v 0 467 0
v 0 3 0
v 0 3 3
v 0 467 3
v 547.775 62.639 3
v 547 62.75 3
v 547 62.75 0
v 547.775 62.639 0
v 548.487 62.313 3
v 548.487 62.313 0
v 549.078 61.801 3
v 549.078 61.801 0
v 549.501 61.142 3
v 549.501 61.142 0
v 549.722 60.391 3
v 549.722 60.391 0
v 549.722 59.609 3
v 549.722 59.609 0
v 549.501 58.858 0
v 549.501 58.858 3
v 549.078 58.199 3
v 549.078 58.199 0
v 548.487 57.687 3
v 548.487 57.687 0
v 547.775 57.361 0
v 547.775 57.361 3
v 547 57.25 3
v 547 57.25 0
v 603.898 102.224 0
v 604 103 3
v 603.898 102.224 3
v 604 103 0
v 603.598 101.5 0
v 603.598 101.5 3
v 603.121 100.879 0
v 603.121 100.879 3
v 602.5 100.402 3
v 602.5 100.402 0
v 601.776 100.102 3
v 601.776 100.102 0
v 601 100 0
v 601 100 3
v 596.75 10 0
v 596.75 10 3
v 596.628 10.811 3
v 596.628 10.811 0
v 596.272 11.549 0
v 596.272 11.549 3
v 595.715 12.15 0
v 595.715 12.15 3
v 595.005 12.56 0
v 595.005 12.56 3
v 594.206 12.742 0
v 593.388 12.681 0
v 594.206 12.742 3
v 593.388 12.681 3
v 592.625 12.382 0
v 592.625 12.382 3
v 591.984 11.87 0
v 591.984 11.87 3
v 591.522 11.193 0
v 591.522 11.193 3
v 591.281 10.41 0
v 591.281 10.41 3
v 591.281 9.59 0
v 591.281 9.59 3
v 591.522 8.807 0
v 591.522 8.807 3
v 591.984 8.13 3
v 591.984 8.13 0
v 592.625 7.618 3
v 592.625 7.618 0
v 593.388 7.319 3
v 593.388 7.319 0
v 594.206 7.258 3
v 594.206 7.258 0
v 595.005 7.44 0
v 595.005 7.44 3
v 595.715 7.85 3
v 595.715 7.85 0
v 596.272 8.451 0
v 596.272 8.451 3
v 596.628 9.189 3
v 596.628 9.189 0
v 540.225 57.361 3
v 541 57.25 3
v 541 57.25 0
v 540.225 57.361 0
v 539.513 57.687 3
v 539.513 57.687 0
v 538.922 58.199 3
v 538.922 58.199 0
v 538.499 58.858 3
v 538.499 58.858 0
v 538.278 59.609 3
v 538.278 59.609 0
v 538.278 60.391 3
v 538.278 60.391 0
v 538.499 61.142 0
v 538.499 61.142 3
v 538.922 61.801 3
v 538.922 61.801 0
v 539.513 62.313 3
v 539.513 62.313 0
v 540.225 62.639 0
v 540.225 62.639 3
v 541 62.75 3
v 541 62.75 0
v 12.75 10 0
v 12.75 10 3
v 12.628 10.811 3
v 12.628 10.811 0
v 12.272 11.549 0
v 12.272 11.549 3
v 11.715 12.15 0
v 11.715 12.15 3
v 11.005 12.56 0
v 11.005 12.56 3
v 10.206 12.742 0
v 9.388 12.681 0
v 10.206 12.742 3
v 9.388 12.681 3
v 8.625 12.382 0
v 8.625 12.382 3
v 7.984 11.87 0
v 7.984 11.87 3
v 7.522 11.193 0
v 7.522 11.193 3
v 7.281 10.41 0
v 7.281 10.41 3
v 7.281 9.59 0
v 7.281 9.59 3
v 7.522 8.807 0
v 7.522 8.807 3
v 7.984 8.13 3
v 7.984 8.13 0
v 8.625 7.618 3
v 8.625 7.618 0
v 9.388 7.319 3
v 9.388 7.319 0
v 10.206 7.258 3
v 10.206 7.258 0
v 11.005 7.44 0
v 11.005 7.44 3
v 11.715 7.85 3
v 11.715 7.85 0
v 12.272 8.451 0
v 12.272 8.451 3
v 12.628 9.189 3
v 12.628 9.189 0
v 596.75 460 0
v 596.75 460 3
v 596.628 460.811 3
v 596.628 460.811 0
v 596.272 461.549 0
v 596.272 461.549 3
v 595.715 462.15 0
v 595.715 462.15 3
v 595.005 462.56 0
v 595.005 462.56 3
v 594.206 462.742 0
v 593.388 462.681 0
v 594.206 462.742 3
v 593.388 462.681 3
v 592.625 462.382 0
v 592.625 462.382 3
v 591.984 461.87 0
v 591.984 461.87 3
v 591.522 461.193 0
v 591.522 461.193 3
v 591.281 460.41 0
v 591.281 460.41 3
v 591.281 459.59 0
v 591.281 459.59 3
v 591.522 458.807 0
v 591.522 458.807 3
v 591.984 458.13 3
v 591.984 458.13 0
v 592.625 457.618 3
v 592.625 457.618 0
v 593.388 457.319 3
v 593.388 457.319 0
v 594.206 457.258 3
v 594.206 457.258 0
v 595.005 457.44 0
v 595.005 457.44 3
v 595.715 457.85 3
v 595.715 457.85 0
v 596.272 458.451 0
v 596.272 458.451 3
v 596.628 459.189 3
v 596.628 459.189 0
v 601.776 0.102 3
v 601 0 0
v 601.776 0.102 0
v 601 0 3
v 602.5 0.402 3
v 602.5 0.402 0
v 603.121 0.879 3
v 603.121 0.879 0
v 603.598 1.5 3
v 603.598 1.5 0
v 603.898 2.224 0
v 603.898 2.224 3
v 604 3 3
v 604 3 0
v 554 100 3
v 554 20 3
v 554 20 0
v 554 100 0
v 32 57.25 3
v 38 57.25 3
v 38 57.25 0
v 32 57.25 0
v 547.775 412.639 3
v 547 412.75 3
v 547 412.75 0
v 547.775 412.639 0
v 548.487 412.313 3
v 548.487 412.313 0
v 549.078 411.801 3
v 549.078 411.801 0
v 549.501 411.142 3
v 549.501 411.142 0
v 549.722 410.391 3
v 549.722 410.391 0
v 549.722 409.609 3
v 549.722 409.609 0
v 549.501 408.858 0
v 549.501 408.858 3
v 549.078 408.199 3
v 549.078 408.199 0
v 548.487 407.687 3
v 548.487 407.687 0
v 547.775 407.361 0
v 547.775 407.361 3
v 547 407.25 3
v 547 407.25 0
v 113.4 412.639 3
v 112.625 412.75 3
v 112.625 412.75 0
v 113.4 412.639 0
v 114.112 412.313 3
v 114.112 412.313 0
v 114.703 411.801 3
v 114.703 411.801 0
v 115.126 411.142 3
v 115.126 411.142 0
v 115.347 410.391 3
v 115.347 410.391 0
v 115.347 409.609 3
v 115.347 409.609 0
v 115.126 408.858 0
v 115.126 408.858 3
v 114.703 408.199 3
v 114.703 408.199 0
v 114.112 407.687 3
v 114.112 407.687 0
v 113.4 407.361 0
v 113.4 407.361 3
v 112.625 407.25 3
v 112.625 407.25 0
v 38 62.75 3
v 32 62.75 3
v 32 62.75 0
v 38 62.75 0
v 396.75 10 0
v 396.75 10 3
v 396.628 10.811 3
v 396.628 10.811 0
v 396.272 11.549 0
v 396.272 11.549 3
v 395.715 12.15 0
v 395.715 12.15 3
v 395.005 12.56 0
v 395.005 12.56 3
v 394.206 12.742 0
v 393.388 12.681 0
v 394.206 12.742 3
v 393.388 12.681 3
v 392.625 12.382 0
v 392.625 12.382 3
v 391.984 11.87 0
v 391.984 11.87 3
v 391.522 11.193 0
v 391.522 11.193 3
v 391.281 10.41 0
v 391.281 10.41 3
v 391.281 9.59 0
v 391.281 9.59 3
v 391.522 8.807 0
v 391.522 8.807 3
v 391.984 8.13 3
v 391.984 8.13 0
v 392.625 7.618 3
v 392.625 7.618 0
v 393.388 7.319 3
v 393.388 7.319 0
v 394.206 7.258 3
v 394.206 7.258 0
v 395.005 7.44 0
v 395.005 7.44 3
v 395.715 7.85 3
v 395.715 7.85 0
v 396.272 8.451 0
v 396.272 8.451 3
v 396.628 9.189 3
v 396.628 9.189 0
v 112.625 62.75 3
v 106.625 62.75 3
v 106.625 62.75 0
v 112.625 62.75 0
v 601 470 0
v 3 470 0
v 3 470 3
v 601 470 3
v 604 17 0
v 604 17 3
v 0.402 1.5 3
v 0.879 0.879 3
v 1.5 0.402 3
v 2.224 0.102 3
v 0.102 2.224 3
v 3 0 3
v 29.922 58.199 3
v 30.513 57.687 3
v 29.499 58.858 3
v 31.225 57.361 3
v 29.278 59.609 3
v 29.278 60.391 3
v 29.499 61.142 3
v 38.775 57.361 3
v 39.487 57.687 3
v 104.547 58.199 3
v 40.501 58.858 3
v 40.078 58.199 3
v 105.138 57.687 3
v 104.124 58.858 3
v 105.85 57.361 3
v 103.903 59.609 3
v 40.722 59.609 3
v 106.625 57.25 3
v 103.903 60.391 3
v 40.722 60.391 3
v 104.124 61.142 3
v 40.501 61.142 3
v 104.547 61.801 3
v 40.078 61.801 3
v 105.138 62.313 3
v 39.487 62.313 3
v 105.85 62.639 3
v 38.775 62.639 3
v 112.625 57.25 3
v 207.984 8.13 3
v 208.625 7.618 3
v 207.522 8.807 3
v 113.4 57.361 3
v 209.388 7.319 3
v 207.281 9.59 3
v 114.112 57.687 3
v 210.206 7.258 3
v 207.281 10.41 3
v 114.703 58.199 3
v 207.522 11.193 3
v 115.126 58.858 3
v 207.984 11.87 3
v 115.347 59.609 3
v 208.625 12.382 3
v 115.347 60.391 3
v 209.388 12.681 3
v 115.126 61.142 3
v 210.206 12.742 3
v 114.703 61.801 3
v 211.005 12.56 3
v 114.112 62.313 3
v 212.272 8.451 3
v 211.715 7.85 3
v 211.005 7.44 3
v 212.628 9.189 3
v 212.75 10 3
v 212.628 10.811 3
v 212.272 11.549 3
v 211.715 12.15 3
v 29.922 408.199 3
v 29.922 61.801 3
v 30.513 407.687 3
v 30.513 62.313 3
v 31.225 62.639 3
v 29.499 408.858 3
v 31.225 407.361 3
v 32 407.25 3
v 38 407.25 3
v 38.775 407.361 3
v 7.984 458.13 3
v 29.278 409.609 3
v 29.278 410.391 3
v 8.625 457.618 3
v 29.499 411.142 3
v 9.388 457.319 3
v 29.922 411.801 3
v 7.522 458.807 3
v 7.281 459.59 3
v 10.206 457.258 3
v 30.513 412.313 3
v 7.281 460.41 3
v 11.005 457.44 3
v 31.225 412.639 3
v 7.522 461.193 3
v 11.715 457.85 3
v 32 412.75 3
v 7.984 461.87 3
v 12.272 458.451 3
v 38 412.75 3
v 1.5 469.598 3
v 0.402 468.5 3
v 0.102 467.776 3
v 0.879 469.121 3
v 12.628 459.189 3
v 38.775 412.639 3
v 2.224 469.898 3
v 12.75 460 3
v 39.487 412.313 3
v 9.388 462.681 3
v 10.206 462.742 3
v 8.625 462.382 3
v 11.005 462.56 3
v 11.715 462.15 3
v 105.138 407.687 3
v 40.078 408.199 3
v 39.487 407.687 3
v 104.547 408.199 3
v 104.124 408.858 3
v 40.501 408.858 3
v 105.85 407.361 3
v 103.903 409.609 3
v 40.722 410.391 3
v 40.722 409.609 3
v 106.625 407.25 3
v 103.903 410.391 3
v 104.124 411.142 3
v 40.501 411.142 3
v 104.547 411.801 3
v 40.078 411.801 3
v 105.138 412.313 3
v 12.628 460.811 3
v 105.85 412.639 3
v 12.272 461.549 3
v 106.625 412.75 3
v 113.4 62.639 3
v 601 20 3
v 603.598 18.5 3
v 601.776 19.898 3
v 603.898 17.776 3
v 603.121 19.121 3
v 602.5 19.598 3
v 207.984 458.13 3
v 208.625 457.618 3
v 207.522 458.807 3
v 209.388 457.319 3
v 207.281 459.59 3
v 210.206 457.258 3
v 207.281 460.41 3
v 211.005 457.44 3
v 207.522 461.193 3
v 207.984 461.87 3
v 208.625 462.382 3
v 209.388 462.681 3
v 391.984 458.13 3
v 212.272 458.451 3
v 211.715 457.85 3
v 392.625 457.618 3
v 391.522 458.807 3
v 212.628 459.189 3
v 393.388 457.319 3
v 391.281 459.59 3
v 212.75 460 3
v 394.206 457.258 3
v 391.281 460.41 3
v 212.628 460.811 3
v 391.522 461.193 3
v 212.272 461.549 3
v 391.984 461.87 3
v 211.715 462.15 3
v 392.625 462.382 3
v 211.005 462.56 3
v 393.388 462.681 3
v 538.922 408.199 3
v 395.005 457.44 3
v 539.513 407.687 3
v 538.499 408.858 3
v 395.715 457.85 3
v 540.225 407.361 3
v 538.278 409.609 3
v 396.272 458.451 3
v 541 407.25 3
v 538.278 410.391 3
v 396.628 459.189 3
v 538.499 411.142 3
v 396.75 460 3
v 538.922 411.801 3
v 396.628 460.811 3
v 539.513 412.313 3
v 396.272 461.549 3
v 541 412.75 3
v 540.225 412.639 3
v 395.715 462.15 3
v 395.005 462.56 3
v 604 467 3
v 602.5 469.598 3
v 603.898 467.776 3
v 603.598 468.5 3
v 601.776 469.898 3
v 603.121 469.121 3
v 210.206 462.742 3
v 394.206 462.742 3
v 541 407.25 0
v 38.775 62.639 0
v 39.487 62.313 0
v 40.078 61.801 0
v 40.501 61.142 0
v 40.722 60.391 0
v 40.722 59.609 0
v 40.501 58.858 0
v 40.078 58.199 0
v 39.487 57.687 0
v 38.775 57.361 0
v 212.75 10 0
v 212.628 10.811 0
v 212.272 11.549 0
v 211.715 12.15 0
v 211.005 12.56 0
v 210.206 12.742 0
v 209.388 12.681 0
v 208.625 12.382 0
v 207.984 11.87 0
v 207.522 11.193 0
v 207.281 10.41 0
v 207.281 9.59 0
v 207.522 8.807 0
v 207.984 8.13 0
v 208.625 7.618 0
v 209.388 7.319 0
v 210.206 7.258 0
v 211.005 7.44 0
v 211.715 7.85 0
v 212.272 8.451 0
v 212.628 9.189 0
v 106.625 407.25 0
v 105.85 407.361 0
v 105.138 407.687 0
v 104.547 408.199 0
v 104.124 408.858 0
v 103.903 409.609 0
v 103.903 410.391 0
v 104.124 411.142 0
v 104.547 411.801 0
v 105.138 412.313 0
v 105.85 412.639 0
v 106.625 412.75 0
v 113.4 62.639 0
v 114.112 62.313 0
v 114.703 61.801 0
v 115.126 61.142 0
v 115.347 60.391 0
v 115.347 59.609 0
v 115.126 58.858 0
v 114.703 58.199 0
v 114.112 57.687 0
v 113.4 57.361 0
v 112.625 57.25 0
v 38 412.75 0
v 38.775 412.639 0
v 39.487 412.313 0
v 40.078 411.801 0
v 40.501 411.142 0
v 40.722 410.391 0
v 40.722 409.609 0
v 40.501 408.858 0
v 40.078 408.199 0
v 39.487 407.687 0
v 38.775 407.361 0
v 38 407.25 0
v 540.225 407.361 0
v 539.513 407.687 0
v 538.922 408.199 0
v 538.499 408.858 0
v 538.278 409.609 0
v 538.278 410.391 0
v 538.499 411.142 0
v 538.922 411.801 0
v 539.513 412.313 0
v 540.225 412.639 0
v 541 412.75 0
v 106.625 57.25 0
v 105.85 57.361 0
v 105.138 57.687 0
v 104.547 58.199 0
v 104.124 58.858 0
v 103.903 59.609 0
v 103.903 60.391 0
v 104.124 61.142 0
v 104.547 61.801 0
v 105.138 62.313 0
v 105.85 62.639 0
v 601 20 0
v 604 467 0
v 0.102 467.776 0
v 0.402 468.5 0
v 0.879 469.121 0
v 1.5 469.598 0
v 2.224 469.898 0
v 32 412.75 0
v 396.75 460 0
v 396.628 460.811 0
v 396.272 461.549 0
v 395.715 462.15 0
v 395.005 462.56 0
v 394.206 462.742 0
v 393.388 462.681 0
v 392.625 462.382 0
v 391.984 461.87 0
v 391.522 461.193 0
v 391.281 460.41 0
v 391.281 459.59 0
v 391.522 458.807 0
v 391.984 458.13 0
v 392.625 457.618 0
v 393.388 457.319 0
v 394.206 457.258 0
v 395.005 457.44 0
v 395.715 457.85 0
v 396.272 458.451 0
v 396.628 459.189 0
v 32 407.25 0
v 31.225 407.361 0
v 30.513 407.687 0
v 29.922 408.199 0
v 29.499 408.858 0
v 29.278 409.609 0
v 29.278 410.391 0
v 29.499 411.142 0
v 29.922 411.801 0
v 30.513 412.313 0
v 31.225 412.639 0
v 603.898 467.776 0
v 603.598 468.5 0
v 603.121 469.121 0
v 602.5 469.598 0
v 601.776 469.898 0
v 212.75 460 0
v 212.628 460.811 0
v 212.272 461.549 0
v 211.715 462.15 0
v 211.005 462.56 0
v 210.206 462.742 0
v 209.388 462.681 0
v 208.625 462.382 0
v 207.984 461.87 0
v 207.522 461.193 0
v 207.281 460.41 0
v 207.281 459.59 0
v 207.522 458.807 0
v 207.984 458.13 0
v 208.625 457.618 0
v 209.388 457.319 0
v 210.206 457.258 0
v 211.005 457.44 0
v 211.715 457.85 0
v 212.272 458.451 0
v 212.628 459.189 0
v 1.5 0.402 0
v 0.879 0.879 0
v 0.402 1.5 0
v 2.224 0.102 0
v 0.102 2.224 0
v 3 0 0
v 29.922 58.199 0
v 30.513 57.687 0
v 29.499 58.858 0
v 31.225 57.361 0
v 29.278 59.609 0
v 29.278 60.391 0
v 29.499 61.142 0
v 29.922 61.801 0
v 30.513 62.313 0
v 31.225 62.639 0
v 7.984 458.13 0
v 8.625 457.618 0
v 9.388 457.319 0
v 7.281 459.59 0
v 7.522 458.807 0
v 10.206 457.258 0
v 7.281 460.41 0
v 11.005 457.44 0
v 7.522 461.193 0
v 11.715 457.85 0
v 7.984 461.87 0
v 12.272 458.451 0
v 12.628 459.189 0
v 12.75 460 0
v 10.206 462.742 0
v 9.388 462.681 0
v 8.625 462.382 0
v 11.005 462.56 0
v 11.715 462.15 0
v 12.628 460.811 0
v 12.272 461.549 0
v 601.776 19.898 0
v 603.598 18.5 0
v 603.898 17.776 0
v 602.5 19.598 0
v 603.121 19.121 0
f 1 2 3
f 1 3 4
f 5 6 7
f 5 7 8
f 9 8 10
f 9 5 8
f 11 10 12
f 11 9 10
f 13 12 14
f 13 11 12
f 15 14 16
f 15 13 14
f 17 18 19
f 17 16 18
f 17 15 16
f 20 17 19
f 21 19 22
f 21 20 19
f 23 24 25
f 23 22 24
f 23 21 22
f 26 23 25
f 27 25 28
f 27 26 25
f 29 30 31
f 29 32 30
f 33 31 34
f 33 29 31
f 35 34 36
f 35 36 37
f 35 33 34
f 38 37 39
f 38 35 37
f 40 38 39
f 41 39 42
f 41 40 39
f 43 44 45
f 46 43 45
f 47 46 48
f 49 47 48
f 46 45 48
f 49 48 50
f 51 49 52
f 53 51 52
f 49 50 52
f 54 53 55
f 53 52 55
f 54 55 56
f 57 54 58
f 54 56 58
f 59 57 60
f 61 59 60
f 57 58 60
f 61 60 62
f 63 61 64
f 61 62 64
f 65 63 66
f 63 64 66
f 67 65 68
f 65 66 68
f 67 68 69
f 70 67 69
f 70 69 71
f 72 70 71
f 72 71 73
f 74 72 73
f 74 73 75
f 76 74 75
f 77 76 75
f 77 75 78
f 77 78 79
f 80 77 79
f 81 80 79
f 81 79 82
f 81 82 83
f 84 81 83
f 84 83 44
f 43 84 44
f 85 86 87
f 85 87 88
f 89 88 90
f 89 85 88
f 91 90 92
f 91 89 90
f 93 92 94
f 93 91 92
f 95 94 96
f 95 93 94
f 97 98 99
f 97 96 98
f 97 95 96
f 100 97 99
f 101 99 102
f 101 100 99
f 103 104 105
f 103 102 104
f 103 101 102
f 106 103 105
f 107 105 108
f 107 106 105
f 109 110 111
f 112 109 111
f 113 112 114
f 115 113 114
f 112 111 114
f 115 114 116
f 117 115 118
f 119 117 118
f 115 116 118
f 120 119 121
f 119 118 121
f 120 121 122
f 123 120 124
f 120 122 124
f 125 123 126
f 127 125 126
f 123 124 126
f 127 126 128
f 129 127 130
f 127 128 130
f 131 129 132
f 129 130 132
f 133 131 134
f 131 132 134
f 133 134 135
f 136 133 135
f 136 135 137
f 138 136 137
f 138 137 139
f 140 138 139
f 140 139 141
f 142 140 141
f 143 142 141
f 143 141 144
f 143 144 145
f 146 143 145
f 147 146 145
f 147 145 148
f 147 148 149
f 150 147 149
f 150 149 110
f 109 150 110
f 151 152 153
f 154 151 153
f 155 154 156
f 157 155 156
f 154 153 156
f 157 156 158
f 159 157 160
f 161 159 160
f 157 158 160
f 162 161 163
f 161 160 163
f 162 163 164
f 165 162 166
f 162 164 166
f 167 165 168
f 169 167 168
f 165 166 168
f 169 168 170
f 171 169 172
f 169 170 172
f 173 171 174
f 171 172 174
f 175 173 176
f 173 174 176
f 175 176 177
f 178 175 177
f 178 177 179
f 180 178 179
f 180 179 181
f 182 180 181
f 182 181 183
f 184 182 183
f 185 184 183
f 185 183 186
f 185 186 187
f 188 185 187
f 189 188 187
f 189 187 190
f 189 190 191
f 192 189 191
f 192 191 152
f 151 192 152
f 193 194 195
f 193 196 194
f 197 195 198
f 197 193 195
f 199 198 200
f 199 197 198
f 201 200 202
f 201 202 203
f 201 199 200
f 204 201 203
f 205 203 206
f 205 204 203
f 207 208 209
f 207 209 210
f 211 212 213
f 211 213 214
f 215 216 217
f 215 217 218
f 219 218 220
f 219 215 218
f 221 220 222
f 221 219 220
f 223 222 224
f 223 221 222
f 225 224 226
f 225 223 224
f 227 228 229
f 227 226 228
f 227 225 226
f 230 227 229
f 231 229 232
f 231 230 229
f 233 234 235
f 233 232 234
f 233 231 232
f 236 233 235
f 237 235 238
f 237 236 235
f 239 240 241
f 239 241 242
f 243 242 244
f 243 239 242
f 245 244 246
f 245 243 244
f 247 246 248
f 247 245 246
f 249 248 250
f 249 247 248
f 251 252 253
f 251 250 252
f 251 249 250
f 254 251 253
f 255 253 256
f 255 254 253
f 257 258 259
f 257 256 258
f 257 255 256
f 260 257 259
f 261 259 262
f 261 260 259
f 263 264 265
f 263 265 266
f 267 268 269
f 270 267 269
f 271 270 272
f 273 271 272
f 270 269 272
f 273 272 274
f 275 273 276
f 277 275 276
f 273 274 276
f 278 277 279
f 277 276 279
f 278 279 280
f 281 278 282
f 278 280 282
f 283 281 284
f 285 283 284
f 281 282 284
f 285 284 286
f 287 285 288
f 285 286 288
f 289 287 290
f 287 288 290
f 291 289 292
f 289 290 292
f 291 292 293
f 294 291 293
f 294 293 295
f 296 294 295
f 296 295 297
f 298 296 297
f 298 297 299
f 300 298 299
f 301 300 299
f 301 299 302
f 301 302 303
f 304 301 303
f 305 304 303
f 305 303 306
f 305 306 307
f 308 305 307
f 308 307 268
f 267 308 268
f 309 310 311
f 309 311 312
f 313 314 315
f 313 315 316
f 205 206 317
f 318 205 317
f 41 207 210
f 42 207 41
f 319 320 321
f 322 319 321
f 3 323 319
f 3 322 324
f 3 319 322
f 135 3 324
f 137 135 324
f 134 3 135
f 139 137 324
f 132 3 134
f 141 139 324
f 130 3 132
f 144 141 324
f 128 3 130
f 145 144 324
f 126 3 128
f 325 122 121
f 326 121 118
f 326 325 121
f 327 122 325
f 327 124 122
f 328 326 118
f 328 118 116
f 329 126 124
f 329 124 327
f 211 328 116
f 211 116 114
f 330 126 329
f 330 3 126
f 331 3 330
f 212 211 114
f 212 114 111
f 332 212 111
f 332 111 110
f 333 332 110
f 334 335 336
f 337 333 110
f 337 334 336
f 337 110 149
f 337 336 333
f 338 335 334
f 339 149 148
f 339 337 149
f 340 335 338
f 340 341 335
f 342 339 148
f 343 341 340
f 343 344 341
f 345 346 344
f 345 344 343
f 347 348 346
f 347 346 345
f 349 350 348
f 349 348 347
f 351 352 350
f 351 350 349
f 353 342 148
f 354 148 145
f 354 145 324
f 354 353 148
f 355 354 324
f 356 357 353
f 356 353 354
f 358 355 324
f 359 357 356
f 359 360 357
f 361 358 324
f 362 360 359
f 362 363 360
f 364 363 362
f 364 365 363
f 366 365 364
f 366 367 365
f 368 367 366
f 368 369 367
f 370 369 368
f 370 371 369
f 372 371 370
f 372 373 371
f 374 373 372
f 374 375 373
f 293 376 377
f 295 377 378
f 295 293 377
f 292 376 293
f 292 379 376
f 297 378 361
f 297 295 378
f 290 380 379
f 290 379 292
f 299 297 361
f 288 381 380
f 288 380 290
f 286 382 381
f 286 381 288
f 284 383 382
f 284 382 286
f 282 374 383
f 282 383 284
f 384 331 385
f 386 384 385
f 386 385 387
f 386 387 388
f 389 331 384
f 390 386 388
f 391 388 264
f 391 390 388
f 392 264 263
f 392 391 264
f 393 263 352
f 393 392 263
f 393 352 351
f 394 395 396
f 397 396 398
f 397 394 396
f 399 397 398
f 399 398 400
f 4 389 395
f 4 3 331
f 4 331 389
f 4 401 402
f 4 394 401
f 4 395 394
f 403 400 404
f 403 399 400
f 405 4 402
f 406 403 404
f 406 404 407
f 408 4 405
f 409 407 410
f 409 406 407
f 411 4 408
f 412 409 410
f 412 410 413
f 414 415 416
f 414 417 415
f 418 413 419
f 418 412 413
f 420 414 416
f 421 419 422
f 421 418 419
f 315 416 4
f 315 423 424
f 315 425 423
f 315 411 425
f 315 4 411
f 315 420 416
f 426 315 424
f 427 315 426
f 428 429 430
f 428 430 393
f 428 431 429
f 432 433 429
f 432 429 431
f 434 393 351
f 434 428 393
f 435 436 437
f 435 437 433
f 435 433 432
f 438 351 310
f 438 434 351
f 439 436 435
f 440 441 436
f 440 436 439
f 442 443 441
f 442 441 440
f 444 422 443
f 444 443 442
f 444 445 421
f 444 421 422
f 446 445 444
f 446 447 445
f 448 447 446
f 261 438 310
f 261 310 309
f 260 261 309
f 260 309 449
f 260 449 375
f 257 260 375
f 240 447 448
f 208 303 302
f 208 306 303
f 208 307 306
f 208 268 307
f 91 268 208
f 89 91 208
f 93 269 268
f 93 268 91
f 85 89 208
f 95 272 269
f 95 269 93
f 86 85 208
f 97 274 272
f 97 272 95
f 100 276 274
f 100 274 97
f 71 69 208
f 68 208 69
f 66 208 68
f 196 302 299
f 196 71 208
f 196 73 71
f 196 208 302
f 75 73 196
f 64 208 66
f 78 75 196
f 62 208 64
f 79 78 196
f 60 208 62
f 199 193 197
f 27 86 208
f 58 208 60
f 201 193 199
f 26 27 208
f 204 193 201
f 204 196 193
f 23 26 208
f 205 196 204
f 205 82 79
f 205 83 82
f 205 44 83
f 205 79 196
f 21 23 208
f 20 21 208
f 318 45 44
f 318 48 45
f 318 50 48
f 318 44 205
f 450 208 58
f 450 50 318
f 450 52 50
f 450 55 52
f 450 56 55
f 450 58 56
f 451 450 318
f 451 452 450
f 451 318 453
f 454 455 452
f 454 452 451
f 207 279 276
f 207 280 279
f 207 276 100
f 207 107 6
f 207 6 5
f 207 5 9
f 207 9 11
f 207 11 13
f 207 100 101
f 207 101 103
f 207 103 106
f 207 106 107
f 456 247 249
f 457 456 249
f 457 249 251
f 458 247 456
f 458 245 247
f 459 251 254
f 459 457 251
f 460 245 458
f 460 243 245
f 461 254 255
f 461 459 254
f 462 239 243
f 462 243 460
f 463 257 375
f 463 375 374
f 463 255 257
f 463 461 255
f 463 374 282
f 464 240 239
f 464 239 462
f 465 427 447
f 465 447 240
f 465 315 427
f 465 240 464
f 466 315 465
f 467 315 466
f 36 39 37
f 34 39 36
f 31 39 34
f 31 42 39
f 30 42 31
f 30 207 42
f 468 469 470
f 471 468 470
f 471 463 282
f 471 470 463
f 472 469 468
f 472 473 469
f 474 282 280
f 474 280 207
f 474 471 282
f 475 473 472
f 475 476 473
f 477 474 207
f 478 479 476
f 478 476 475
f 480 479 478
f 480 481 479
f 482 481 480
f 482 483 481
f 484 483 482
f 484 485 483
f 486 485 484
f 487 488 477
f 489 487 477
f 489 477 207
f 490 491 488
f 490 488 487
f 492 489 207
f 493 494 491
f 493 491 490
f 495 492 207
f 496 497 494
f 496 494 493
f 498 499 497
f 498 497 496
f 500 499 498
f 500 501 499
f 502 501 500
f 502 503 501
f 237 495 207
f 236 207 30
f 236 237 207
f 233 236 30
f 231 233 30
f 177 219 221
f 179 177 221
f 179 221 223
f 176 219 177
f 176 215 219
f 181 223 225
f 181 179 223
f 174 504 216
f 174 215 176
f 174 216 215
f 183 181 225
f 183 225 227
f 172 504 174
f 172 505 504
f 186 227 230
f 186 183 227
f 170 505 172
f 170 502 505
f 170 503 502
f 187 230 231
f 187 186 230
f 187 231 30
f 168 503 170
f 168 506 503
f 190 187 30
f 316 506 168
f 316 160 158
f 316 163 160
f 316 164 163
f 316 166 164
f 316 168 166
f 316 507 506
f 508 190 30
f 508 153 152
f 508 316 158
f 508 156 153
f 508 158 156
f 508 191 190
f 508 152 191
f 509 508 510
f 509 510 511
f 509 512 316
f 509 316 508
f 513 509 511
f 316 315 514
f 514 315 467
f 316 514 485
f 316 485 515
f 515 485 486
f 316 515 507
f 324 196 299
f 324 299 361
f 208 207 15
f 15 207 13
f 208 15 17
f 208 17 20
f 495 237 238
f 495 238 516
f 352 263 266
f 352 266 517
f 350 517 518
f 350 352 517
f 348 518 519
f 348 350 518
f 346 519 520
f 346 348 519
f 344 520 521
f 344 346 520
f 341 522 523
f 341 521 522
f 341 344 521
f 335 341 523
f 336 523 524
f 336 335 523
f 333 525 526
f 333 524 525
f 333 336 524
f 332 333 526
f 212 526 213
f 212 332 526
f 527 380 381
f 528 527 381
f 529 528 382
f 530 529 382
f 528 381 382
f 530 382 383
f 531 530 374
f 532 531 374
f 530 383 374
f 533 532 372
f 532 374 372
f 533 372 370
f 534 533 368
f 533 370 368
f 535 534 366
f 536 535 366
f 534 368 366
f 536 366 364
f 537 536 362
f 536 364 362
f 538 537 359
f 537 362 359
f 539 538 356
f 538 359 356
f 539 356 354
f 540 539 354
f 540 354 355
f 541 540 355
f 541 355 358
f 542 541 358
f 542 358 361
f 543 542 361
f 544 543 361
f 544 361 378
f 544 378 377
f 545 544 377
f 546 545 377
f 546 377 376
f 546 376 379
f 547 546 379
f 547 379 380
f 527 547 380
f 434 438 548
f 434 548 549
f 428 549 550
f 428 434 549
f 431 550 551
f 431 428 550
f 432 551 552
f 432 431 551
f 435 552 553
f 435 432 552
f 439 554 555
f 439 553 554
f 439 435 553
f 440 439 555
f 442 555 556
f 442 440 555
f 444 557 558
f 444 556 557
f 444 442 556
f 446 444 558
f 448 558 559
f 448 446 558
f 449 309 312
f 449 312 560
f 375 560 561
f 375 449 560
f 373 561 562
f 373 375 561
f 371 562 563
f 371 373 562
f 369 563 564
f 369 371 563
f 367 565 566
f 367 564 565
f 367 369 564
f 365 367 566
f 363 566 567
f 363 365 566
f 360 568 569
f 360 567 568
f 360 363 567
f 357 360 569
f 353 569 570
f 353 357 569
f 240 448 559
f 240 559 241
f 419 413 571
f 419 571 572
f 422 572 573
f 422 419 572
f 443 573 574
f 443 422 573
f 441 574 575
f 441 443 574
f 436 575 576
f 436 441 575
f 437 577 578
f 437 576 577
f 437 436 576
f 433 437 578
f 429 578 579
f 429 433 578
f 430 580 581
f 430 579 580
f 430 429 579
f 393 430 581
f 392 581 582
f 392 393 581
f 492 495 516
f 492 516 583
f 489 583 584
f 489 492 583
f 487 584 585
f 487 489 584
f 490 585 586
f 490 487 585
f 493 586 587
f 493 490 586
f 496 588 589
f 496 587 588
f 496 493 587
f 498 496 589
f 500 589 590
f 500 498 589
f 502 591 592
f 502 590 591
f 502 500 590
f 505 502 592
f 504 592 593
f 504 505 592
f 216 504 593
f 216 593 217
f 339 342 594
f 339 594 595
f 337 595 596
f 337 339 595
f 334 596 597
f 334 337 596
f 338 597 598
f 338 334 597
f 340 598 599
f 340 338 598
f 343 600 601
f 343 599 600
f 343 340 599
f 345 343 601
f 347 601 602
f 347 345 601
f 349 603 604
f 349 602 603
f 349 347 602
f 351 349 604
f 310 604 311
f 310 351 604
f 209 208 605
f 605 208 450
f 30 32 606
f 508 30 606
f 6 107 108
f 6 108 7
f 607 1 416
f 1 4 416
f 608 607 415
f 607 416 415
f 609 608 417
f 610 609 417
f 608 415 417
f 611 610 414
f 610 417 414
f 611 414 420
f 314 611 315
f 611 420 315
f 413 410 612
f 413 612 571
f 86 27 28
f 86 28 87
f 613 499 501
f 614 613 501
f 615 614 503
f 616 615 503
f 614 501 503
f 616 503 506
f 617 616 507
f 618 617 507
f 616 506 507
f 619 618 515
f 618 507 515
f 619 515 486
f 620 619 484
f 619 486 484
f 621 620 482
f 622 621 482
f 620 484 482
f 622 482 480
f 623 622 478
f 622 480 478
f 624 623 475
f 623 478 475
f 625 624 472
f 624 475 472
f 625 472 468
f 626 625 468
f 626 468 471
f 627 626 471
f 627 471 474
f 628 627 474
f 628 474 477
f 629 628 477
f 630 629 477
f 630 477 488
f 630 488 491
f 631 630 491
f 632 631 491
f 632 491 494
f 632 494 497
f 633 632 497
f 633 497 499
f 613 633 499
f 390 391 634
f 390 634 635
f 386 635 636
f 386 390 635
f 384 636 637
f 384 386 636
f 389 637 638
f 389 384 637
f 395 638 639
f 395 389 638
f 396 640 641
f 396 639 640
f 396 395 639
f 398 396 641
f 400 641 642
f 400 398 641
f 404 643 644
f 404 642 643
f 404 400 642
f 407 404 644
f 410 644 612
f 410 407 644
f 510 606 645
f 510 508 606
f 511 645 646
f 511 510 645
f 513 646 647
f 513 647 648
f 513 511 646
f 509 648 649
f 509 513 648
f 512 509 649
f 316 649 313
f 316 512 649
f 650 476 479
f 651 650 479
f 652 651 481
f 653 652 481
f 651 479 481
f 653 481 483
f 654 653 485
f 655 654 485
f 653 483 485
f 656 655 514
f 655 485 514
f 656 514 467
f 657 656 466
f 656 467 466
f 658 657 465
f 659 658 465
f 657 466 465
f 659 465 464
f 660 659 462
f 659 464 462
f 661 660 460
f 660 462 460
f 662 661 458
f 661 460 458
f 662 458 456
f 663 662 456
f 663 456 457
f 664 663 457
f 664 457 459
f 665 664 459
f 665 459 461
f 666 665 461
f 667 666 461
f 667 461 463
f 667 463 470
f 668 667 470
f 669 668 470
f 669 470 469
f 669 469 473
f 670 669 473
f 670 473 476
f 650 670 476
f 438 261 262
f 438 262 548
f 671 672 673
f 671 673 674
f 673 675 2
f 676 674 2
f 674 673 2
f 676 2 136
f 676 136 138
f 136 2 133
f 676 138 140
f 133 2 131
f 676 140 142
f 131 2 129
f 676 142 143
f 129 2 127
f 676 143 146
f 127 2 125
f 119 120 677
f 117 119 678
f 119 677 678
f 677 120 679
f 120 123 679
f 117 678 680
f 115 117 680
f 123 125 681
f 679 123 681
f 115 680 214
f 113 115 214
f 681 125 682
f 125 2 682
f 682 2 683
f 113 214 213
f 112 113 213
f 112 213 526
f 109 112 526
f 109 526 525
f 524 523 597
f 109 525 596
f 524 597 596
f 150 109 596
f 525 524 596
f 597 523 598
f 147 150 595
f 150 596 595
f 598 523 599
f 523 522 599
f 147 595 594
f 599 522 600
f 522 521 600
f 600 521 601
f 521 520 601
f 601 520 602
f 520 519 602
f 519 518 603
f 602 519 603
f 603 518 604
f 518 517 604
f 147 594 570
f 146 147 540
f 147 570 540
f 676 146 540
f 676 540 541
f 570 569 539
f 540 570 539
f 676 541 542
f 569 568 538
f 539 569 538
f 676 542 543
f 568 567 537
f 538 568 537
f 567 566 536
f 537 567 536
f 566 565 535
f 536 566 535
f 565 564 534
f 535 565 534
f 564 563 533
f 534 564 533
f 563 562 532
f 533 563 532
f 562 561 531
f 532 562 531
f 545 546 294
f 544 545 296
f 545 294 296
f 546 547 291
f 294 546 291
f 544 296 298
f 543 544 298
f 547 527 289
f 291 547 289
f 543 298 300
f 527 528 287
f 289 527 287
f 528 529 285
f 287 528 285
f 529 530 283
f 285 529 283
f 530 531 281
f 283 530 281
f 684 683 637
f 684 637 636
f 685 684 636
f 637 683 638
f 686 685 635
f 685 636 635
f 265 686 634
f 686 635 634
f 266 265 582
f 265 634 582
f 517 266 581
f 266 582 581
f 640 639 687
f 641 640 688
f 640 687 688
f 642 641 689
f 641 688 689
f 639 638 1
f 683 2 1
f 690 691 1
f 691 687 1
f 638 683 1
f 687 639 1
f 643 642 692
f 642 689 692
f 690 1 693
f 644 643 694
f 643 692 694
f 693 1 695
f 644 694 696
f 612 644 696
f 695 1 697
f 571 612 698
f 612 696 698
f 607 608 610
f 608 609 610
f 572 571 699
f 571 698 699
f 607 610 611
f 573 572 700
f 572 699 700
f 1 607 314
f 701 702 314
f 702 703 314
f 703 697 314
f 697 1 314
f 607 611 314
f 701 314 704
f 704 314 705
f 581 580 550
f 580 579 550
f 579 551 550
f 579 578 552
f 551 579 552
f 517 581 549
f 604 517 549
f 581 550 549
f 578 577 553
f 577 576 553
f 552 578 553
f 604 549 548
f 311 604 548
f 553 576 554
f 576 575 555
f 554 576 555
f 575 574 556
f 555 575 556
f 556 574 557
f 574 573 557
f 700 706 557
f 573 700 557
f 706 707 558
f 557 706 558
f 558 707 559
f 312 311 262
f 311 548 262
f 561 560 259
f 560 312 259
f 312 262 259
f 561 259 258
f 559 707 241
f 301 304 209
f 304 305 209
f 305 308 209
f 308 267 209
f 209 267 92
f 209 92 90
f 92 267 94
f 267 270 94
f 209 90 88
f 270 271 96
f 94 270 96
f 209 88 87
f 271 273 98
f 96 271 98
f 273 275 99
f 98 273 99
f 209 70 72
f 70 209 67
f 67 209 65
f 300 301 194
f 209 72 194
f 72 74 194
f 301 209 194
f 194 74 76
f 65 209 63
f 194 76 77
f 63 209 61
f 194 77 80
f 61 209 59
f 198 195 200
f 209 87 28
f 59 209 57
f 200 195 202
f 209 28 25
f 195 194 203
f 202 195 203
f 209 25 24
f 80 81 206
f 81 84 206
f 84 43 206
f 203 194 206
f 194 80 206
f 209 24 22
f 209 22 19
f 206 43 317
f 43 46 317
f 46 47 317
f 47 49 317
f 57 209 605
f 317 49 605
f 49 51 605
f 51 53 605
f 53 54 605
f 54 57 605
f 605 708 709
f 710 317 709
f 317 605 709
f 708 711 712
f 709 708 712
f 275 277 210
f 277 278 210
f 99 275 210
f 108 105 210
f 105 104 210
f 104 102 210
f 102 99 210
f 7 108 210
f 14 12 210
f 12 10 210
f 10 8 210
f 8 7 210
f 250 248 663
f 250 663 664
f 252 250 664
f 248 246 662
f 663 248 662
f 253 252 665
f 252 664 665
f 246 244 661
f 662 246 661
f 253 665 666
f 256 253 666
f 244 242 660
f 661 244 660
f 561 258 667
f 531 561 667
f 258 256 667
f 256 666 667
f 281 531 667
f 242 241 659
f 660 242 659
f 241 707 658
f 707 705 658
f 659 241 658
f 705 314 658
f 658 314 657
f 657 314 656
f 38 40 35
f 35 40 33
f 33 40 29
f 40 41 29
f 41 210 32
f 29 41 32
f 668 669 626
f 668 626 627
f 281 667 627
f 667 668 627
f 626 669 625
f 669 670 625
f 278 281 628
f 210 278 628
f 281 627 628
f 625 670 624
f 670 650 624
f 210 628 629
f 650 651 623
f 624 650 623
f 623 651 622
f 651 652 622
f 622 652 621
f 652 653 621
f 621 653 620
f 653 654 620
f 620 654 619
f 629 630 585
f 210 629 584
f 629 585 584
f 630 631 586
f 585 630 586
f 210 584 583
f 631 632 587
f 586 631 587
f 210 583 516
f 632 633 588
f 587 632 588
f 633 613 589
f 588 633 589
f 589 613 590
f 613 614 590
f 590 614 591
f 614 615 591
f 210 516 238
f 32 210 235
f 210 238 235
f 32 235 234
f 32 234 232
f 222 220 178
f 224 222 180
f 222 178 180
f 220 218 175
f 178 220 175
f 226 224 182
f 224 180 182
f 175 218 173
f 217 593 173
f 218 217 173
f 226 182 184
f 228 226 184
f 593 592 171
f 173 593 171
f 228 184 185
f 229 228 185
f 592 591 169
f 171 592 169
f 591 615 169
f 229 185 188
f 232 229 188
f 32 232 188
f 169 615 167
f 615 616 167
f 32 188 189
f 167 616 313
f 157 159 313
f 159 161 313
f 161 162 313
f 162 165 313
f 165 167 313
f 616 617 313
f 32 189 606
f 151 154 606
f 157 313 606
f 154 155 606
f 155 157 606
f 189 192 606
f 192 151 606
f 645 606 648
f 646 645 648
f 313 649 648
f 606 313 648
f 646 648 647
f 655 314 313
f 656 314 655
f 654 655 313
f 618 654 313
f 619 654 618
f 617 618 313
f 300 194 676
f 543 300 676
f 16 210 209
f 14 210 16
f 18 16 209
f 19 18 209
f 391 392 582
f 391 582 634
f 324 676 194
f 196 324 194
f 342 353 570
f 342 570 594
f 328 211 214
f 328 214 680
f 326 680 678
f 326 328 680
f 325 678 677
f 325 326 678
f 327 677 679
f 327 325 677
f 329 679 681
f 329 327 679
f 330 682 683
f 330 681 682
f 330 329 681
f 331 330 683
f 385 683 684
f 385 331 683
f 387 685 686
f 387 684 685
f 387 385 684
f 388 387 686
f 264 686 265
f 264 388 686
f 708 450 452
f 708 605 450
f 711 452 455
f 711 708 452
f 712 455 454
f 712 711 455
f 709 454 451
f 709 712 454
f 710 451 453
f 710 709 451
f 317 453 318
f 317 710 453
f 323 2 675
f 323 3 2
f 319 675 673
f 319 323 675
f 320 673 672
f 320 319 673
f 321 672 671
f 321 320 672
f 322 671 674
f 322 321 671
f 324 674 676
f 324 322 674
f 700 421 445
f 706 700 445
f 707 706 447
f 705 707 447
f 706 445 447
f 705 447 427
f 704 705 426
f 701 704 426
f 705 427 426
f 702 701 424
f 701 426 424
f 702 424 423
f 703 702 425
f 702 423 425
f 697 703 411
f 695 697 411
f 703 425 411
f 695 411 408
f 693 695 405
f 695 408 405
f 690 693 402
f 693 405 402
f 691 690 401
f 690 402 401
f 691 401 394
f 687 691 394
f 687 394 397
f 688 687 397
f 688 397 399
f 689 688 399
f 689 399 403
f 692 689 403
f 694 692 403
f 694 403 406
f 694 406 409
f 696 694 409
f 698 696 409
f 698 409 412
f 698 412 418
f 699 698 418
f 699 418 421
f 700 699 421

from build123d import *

# Parameters (mm, degrees)
SKETCH1_W            = 604
SKETCH1_H            = 470
BOSS_EXTRUDE1_DEPTH  = 3
FILLET1_R            = 3
M5_CLEARANCE_HOLE1_D = 5.5
CUT_EXTRUDE5_DEPTH   = 766.326727614
SKETCH10_W           = 50
SKETCH10_H           = 80
CUT_EXTRUDE6_DEPTH   = 766.326727614
FILLET5_R            = 3


with BuildPart() as part:
    # Sketch1 → Boss-Extrude1 (new body)
    with BuildSketch(Plane.XY):
        with Locations((302, 235)):
            Rectangle(SKETCH1_W, SKETCH1_H)
    extrude(amount=BOSS_EXTRUDE1_DEPTH)

    # Fillet1
    fillet1_edges = [part.edges().sort_by_distance(p)[0] for p in [
        (0, 470, 1.5),
        (604, 470, 1.5),
        (604, 0, 1.5),
        (0, 0, 1.5),
    ]]
    fillet(fillet1_edges, radius=FILLET1_R)

    # M5 Clearance Hole1 (through all)
    with Locations(Plane(origin=(0, 0, 0), x_dir=(-1, 0, 0), z_dir=(0, 0, -1))):
        with Locations((-594, 460), (-394, 460), (-210, 460), (-10, 460), (-10, 10), (-210, 10), (-394, 10), (-594, 10), (-544, 410), (-544, 60), (-35, 410), (-35, 60), (-109.625, 410), (-109.625, 60)):
            Hole(M5_CLEARANCE_HOLE1_D / 2)

    # Sketch9 → Cut-Extrude5 (cut, through all)
    with BuildSketch(Plane.XY.offset(3)):
        with BuildLine():
            Line((32, 412.75), (38, 412.75))
            ThreePointArc((38, 412.75), (40.75, 410), (38, 407.25))
            Line((38, 407.25), (32, 407.25))
            ThreePointArc((32, 407.25), (29.25, 410), (32, 412.75))
        make_face()
        with BuildLine():
            Line((106.625, 412.75), (112.625, 412.75))
            ThreePointArc((112.625, 412.75), (115.375, 410), (112.625, 407.25))
            Line((112.625, 407.25), (106.625, 407.25))
            ThreePointArc((106.625, 407.25), (103.875, 410), (106.625, 412.75))
        make_face()
        with BuildLine():
            Line((32, 62.75), (38, 62.75))
            ThreePointArc((38, 62.75), (40.75, 60), (38, 57.25))
            Line((38, 57.25), (32, 57.25))
            ThreePointArc((32, 57.25), (29.25, 60), (32, 62.75))
        make_face()
        with BuildLine():
            Line((106.625, 62.75), (112.625, 62.75))
            ThreePointArc((112.625, 62.75), (115.375, 60), (112.625, 57.25))
            Line((112.625, 57.25), (106.625, 57.25))
            ThreePointArc((106.625, 57.25), (103.875, 60), (106.625, 62.75))
        make_face()
        with BuildLine():
            Line((541, 412.75), (547, 412.75))
            ThreePointArc((547, 412.75), (549.75, 410), (547, 407.25))
            Line((547, 407.25), (541, 407.25))
            ThreePointArc((541, 407.25), (538.25, 410), (541, 412.75))
        make_face()
        with BuildLine():
            Line((541, 62.75), (547, 62.75))
            ThreePointArc((547, 62.75), (549.75, 60), (547, 57.25))
            Line((547, 57.25), (541, 57.25))
            ThreePointArc((541, 57.25), (538.25, 60), (541, 62.75))
        make_face()
    extrude(amount=-CUT_EXTRUDE5_DEPTH, mode=Mode.SUBTRACT)

    # Sketch10 → Cut-Extrude6 (cut, through all)
    with BuildSketch(Plane.XY.offset(3)):
        with Locations((579, 60)):
            Rectangle(SKETCH10_W, SKETCH10_H)
    extrude(amount=-CUT_EXTRUDE6_DEPTH, mode=Mode.SUBTRACT)

    # Fillet5
    fillet5_edges = [part.edges().sort_by_distance(p)[0] for p in [
        (604, 100, 1.5),
        (604, 20, 1.5),
    ]]
    fillet(fillet5_edges, radius=FILLET5_R)


solid = part.part
